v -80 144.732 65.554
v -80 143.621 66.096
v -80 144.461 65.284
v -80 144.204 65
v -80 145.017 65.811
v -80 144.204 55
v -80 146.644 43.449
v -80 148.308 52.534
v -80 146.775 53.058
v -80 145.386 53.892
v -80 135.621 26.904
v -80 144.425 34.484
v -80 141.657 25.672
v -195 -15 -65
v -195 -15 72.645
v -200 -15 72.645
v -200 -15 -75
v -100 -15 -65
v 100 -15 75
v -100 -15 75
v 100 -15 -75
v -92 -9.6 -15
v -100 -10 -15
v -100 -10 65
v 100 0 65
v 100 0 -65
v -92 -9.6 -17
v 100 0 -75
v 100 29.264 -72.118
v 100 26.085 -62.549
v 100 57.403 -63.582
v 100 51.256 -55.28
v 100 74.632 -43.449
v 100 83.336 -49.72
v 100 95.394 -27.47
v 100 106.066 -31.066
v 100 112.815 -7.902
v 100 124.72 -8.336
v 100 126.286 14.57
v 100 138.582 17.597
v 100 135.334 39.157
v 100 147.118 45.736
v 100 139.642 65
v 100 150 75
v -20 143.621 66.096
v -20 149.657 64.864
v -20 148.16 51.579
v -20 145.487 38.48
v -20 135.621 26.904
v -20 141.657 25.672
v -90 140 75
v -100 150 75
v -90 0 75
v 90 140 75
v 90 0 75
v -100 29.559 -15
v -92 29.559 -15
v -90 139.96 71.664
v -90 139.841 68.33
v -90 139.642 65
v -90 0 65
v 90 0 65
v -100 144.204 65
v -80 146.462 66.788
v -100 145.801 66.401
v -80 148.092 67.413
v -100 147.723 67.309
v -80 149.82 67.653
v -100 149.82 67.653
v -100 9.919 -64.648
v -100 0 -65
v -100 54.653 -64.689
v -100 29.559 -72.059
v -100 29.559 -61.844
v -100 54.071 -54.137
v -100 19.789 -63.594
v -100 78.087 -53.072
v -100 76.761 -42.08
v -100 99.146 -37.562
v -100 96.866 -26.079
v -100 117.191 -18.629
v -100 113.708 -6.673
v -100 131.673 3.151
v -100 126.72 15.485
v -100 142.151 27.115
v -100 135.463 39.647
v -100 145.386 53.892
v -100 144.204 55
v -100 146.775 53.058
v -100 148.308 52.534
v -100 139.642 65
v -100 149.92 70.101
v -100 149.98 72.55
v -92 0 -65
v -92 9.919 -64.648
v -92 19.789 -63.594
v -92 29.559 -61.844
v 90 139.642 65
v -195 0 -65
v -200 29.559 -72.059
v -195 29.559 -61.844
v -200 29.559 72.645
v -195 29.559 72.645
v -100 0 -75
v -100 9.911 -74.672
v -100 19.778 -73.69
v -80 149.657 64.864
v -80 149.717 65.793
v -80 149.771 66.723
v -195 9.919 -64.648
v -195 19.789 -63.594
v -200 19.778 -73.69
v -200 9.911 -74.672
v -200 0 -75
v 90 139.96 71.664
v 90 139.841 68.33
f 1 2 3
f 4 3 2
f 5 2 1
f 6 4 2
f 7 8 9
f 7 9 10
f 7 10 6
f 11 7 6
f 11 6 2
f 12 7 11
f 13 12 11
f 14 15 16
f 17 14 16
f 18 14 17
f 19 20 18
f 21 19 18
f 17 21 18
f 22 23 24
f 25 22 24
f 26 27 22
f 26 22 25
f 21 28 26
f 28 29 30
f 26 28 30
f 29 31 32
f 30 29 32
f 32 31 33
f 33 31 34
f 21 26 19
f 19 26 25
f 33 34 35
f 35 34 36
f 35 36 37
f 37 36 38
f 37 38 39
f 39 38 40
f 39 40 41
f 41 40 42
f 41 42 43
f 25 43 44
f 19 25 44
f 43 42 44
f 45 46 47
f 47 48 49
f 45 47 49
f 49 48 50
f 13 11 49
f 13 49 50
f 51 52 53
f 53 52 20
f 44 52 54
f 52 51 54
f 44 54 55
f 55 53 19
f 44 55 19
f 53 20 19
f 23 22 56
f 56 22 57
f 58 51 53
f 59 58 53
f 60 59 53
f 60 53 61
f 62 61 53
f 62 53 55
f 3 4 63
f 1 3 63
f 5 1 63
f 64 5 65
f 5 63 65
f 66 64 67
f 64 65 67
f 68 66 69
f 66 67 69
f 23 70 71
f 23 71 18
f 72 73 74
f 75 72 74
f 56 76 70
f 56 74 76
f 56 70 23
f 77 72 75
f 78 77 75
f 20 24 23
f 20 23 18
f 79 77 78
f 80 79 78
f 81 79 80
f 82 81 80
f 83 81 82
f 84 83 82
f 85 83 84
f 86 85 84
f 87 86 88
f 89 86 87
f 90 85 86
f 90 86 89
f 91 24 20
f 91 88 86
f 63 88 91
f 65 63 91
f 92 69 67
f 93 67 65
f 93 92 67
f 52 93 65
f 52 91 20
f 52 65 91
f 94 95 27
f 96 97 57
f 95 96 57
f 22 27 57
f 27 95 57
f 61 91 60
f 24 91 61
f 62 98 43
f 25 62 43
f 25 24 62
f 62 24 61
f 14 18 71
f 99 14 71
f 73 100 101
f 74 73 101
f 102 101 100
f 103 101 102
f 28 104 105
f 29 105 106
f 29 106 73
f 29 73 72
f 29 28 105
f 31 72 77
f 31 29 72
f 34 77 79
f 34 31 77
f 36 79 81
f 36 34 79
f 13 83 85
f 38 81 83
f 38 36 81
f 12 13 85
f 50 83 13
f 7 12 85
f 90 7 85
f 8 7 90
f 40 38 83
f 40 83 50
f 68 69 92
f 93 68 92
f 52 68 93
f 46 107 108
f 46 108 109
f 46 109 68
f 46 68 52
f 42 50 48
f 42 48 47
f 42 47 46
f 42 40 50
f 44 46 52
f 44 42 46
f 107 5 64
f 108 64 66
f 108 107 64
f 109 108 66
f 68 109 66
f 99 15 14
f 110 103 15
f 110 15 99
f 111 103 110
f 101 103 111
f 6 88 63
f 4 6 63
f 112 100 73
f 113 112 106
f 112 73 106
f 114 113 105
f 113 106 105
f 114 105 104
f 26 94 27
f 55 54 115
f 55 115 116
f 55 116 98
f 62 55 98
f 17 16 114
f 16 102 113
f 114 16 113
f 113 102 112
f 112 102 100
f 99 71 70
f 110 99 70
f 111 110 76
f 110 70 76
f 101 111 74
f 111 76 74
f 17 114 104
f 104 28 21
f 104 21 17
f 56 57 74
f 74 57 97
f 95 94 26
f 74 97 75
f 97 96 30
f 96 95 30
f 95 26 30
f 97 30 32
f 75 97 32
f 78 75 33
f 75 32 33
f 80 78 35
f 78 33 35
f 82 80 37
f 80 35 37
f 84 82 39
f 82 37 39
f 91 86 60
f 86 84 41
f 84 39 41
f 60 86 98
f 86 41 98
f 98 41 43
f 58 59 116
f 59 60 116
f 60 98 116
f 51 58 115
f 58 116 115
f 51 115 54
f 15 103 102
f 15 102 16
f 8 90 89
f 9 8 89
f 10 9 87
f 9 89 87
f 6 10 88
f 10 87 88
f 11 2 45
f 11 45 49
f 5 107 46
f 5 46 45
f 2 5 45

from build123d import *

# Parameters (mm, degrees)
SKETCH1_W                = 200
SKETCH1_H                = 150
BOSS_EXTRUDE1_DEPTH      = 15
SKETCH1_5_W              = 200
SKETCH1_5_H              = 10
REVOLVE1_ANGLE           = 90
BOSS_EXTRUDE3_REACH      = 197.256
BOSS_EXTRUDE3_END_RADIUS = 140
SKETCH1_6_W              = 10
SKETCH1_6_H              = 10
CUT_EXTRUDE2_DEPTH       = 60
CUT_EXTRUDE3_DEPTH       = 20
CUT_LOFT8_START          = -65
CUT_LOFT8_DEPTH          = 130
CUT_LOFT8_START_2        = -100
CUT_LOFT8_2_DEPTH        = 200
BOSS_EXTRUDE5_DEPTH      = 100
BOSS_EXTRUDE6_START      = -8
BOSS_EXTRUDE6_DEPTH      = 8
BOSS_EXTRUDE7_START      = -5
BOSS_EXTRUDE7_DEPTH      = 5


with BuildPart() as part:
    # Sketch1 → Boss-Extrude1 (new body)
    with BuildSketch(Plane(origin=(0, 0, 0), x_dir=(1, 0, 0), z_dir=(0, 1, 0))):
        Rectangle(SKETCH1_W, SKETCH1_H)
    extrude(amount=-BOSS_EXTRUDE1_DEPTH)

    # Sketch1<5> → Revolve1 (revolve)
    with BuildSketch(Plane(origin=(0, 0, 0), x_dir=(1, 0, 0), z_dir=(0, 1, 0))):
        with Locations((0, 70)):
            Rectangle(SKETCH1_5_W, SKETCH1_5_H)
    revolve(axis=Axis((-100, 0, 75), (1, 0, 0)), revolution_arc=REVOLVE1_ANGLE)

    # Boss-Extrude3: up to this cylinder (the profile starts inside it)
    boss_extrude3_end = Plane(origin=(0, 0, 75), z_dir=(-1, 0, 0)) * Cylinder(BOSS_EXTRUDE3_END_RADIUS, 865.512, mode=Mode.PRIVATE)
    # Sketch1<6> → Boss-Extrude3 (add, up to the surface)
    with BuildSketch(Plane(origin=(0, 0, 0), x_dir=(1, 0, 0), z_dir=(0, 1, 0)), mode=Mode.PRIVATE) as boss_extrude3_sk1:
        with Locations((-95, -70)):
            Rectangle(SKETCH1_6_W, SKETCH1_6_H)
    boss_extrude3_tool1 = extrude(boss_extrude3_sk1.sketch, amount=BOSS_EXTRUDE3_REACH, mode=Mode.PRIVATE) & boss_extrude3_end
    add(boss_extrude3_tool1.solids().sort_by_distance((-95, 0, 70))[0])
    # Sketch1<6> → Boss-Extrude3 (add, up to the surface)
    with BuildSketch(Plane(origin=(0, 0, 0), x_dir=(1, 0, 0), z_dir=(0, 1, 0)), mode=Mode.PRIVATE) as boss_extrude3_sk2:
        with Locations((95, -70)):
            Rectangle(SKETCH1_6_W, SKETCH1_6_H)
    boss_extrude3_tool2 = extrude(boss_extrude3_sk2.sketch, amount=BOSS_EXTRUDE3_REACH, mode=Mode.PRIVATE) & boss_extrude3_end
    add(boss_extrude3_tool2.solids().sort_by_distance((95, 0, 70))[0])

    # Sketch5 → Cut-Extrude2 (cut)
    with BuildSketch(Plane.ZY.offset(80)):
        Polygon((66.095917942, 143.620915339), (26.904082058, 135.620915339), (21.904082058, 160.115812766), (61.095917942, 168.115812766), align=None)
    extrude(amount=-CUT_EXTRUDE2_DEPTH, mode=Mode.SUBTRACT)

    # Sketch6 → Cut-Extrude3 (cut)
    with BuildSketch(Plane.ZY.offset(100)):
        with BuildLine():
            Line((55, 144.203533404), (65, 144.203533404))
            ThreePointArc((65, 144.203533404), (60, 157.655), (55, 144.203533404))
        make_face()
    extrude(amount=-CUT_EXTRUDE3_DEPTH, mode=Mode.SUBTRACT)

    # Cut-Loft8: read off the stored shape, not the designer's step
    # Cut-Loft8 outline → Cut-Loft8 (cut)
    with BuildSketch(Plane.XY.offset(CUT_LOFT8_START)):
        Polygon((-100, -10), (100, 0), (-100, 0), align=None)
    extrude(amount=CUT_LOFT8_DEPTH, mode=Mode.SUBTRACT)

    # Cut-Loft8 2 outline → Cut-Loft8 2 (add)
    with BuildSketch(Plane.YZ.offset(CUT_LOFT8_START_2)):
        Polygon((0, -65), (-10.4, -13), (-12, -13), (-12, -65), align=None)
    extrude(amount=CUT_LOFT8_2_DEPTH)

    # Sketch12 → Boss-Extrude5 (add)
    with BuildSketch(Plane.ZY.offset(100)):
        with BuildLine():
            Line((-65, -15), (-65, 0))
            ThreePointArc((-65, 0), (-64.208776017, 14.863266125), (-61.84404743, 29.558529783))
            Line((-61.84404743, 29.558529783), (-72.058809043, 29.558529783))
            ThreePointArc((-72.058809043, 29.558529783), (-74.262891163, 14.852249722), (-75, 0))
            Line((-75, 0), (-75, -15))
            Line((-75, -15), (-65, -15))
        make_face()
    extrude(amount=BOSS_EXTRUDE5_DEPTH)

    # Sketch12<4> → Boss-Extrude6 (add)
    with BuildSketch(Plane.ZY.offset(100).offset(BOSS_EXTRUDE6_START)):
        with BuildLine():
            Line((-65, 0), (-15, -10))
            Line((-15, -10), (-15, 29.558529783))
            Line((-15, 29.558529783), (-61.84404743, 29.558529783))
            ThreePointArc((-61.84404743, 29.558529783), (-64.208776017, 14.863266125), (-65, 0))
        make_face()
    extrude(amount=BOSS_EXTRUDE6_DEPTH)

    # Sketch21 → Boss-Extrude7 (add)
    with BuildSketch(Plane.ZY.offset(200).offset(BOSS_EXTRUDE7_START)):
        with BuildLine():
            Line((-61.84404743, 29.558529783), (72.644533384, 29.558529783))
            Line((72.644533384, 29.558529783), (72.644533384, -15))
            Line((72.644533384, -15), (-65, -15))
            Line((-65, -15), (-65, 0))
            ThreePointArc((-65, 0), (-64.208776017, 14.863266125), (-61.84404743, 29.558529783))
        make_face()
    extrude(amount=BOSS_EXTRUDE7_DEPTH)


solid = part.part
